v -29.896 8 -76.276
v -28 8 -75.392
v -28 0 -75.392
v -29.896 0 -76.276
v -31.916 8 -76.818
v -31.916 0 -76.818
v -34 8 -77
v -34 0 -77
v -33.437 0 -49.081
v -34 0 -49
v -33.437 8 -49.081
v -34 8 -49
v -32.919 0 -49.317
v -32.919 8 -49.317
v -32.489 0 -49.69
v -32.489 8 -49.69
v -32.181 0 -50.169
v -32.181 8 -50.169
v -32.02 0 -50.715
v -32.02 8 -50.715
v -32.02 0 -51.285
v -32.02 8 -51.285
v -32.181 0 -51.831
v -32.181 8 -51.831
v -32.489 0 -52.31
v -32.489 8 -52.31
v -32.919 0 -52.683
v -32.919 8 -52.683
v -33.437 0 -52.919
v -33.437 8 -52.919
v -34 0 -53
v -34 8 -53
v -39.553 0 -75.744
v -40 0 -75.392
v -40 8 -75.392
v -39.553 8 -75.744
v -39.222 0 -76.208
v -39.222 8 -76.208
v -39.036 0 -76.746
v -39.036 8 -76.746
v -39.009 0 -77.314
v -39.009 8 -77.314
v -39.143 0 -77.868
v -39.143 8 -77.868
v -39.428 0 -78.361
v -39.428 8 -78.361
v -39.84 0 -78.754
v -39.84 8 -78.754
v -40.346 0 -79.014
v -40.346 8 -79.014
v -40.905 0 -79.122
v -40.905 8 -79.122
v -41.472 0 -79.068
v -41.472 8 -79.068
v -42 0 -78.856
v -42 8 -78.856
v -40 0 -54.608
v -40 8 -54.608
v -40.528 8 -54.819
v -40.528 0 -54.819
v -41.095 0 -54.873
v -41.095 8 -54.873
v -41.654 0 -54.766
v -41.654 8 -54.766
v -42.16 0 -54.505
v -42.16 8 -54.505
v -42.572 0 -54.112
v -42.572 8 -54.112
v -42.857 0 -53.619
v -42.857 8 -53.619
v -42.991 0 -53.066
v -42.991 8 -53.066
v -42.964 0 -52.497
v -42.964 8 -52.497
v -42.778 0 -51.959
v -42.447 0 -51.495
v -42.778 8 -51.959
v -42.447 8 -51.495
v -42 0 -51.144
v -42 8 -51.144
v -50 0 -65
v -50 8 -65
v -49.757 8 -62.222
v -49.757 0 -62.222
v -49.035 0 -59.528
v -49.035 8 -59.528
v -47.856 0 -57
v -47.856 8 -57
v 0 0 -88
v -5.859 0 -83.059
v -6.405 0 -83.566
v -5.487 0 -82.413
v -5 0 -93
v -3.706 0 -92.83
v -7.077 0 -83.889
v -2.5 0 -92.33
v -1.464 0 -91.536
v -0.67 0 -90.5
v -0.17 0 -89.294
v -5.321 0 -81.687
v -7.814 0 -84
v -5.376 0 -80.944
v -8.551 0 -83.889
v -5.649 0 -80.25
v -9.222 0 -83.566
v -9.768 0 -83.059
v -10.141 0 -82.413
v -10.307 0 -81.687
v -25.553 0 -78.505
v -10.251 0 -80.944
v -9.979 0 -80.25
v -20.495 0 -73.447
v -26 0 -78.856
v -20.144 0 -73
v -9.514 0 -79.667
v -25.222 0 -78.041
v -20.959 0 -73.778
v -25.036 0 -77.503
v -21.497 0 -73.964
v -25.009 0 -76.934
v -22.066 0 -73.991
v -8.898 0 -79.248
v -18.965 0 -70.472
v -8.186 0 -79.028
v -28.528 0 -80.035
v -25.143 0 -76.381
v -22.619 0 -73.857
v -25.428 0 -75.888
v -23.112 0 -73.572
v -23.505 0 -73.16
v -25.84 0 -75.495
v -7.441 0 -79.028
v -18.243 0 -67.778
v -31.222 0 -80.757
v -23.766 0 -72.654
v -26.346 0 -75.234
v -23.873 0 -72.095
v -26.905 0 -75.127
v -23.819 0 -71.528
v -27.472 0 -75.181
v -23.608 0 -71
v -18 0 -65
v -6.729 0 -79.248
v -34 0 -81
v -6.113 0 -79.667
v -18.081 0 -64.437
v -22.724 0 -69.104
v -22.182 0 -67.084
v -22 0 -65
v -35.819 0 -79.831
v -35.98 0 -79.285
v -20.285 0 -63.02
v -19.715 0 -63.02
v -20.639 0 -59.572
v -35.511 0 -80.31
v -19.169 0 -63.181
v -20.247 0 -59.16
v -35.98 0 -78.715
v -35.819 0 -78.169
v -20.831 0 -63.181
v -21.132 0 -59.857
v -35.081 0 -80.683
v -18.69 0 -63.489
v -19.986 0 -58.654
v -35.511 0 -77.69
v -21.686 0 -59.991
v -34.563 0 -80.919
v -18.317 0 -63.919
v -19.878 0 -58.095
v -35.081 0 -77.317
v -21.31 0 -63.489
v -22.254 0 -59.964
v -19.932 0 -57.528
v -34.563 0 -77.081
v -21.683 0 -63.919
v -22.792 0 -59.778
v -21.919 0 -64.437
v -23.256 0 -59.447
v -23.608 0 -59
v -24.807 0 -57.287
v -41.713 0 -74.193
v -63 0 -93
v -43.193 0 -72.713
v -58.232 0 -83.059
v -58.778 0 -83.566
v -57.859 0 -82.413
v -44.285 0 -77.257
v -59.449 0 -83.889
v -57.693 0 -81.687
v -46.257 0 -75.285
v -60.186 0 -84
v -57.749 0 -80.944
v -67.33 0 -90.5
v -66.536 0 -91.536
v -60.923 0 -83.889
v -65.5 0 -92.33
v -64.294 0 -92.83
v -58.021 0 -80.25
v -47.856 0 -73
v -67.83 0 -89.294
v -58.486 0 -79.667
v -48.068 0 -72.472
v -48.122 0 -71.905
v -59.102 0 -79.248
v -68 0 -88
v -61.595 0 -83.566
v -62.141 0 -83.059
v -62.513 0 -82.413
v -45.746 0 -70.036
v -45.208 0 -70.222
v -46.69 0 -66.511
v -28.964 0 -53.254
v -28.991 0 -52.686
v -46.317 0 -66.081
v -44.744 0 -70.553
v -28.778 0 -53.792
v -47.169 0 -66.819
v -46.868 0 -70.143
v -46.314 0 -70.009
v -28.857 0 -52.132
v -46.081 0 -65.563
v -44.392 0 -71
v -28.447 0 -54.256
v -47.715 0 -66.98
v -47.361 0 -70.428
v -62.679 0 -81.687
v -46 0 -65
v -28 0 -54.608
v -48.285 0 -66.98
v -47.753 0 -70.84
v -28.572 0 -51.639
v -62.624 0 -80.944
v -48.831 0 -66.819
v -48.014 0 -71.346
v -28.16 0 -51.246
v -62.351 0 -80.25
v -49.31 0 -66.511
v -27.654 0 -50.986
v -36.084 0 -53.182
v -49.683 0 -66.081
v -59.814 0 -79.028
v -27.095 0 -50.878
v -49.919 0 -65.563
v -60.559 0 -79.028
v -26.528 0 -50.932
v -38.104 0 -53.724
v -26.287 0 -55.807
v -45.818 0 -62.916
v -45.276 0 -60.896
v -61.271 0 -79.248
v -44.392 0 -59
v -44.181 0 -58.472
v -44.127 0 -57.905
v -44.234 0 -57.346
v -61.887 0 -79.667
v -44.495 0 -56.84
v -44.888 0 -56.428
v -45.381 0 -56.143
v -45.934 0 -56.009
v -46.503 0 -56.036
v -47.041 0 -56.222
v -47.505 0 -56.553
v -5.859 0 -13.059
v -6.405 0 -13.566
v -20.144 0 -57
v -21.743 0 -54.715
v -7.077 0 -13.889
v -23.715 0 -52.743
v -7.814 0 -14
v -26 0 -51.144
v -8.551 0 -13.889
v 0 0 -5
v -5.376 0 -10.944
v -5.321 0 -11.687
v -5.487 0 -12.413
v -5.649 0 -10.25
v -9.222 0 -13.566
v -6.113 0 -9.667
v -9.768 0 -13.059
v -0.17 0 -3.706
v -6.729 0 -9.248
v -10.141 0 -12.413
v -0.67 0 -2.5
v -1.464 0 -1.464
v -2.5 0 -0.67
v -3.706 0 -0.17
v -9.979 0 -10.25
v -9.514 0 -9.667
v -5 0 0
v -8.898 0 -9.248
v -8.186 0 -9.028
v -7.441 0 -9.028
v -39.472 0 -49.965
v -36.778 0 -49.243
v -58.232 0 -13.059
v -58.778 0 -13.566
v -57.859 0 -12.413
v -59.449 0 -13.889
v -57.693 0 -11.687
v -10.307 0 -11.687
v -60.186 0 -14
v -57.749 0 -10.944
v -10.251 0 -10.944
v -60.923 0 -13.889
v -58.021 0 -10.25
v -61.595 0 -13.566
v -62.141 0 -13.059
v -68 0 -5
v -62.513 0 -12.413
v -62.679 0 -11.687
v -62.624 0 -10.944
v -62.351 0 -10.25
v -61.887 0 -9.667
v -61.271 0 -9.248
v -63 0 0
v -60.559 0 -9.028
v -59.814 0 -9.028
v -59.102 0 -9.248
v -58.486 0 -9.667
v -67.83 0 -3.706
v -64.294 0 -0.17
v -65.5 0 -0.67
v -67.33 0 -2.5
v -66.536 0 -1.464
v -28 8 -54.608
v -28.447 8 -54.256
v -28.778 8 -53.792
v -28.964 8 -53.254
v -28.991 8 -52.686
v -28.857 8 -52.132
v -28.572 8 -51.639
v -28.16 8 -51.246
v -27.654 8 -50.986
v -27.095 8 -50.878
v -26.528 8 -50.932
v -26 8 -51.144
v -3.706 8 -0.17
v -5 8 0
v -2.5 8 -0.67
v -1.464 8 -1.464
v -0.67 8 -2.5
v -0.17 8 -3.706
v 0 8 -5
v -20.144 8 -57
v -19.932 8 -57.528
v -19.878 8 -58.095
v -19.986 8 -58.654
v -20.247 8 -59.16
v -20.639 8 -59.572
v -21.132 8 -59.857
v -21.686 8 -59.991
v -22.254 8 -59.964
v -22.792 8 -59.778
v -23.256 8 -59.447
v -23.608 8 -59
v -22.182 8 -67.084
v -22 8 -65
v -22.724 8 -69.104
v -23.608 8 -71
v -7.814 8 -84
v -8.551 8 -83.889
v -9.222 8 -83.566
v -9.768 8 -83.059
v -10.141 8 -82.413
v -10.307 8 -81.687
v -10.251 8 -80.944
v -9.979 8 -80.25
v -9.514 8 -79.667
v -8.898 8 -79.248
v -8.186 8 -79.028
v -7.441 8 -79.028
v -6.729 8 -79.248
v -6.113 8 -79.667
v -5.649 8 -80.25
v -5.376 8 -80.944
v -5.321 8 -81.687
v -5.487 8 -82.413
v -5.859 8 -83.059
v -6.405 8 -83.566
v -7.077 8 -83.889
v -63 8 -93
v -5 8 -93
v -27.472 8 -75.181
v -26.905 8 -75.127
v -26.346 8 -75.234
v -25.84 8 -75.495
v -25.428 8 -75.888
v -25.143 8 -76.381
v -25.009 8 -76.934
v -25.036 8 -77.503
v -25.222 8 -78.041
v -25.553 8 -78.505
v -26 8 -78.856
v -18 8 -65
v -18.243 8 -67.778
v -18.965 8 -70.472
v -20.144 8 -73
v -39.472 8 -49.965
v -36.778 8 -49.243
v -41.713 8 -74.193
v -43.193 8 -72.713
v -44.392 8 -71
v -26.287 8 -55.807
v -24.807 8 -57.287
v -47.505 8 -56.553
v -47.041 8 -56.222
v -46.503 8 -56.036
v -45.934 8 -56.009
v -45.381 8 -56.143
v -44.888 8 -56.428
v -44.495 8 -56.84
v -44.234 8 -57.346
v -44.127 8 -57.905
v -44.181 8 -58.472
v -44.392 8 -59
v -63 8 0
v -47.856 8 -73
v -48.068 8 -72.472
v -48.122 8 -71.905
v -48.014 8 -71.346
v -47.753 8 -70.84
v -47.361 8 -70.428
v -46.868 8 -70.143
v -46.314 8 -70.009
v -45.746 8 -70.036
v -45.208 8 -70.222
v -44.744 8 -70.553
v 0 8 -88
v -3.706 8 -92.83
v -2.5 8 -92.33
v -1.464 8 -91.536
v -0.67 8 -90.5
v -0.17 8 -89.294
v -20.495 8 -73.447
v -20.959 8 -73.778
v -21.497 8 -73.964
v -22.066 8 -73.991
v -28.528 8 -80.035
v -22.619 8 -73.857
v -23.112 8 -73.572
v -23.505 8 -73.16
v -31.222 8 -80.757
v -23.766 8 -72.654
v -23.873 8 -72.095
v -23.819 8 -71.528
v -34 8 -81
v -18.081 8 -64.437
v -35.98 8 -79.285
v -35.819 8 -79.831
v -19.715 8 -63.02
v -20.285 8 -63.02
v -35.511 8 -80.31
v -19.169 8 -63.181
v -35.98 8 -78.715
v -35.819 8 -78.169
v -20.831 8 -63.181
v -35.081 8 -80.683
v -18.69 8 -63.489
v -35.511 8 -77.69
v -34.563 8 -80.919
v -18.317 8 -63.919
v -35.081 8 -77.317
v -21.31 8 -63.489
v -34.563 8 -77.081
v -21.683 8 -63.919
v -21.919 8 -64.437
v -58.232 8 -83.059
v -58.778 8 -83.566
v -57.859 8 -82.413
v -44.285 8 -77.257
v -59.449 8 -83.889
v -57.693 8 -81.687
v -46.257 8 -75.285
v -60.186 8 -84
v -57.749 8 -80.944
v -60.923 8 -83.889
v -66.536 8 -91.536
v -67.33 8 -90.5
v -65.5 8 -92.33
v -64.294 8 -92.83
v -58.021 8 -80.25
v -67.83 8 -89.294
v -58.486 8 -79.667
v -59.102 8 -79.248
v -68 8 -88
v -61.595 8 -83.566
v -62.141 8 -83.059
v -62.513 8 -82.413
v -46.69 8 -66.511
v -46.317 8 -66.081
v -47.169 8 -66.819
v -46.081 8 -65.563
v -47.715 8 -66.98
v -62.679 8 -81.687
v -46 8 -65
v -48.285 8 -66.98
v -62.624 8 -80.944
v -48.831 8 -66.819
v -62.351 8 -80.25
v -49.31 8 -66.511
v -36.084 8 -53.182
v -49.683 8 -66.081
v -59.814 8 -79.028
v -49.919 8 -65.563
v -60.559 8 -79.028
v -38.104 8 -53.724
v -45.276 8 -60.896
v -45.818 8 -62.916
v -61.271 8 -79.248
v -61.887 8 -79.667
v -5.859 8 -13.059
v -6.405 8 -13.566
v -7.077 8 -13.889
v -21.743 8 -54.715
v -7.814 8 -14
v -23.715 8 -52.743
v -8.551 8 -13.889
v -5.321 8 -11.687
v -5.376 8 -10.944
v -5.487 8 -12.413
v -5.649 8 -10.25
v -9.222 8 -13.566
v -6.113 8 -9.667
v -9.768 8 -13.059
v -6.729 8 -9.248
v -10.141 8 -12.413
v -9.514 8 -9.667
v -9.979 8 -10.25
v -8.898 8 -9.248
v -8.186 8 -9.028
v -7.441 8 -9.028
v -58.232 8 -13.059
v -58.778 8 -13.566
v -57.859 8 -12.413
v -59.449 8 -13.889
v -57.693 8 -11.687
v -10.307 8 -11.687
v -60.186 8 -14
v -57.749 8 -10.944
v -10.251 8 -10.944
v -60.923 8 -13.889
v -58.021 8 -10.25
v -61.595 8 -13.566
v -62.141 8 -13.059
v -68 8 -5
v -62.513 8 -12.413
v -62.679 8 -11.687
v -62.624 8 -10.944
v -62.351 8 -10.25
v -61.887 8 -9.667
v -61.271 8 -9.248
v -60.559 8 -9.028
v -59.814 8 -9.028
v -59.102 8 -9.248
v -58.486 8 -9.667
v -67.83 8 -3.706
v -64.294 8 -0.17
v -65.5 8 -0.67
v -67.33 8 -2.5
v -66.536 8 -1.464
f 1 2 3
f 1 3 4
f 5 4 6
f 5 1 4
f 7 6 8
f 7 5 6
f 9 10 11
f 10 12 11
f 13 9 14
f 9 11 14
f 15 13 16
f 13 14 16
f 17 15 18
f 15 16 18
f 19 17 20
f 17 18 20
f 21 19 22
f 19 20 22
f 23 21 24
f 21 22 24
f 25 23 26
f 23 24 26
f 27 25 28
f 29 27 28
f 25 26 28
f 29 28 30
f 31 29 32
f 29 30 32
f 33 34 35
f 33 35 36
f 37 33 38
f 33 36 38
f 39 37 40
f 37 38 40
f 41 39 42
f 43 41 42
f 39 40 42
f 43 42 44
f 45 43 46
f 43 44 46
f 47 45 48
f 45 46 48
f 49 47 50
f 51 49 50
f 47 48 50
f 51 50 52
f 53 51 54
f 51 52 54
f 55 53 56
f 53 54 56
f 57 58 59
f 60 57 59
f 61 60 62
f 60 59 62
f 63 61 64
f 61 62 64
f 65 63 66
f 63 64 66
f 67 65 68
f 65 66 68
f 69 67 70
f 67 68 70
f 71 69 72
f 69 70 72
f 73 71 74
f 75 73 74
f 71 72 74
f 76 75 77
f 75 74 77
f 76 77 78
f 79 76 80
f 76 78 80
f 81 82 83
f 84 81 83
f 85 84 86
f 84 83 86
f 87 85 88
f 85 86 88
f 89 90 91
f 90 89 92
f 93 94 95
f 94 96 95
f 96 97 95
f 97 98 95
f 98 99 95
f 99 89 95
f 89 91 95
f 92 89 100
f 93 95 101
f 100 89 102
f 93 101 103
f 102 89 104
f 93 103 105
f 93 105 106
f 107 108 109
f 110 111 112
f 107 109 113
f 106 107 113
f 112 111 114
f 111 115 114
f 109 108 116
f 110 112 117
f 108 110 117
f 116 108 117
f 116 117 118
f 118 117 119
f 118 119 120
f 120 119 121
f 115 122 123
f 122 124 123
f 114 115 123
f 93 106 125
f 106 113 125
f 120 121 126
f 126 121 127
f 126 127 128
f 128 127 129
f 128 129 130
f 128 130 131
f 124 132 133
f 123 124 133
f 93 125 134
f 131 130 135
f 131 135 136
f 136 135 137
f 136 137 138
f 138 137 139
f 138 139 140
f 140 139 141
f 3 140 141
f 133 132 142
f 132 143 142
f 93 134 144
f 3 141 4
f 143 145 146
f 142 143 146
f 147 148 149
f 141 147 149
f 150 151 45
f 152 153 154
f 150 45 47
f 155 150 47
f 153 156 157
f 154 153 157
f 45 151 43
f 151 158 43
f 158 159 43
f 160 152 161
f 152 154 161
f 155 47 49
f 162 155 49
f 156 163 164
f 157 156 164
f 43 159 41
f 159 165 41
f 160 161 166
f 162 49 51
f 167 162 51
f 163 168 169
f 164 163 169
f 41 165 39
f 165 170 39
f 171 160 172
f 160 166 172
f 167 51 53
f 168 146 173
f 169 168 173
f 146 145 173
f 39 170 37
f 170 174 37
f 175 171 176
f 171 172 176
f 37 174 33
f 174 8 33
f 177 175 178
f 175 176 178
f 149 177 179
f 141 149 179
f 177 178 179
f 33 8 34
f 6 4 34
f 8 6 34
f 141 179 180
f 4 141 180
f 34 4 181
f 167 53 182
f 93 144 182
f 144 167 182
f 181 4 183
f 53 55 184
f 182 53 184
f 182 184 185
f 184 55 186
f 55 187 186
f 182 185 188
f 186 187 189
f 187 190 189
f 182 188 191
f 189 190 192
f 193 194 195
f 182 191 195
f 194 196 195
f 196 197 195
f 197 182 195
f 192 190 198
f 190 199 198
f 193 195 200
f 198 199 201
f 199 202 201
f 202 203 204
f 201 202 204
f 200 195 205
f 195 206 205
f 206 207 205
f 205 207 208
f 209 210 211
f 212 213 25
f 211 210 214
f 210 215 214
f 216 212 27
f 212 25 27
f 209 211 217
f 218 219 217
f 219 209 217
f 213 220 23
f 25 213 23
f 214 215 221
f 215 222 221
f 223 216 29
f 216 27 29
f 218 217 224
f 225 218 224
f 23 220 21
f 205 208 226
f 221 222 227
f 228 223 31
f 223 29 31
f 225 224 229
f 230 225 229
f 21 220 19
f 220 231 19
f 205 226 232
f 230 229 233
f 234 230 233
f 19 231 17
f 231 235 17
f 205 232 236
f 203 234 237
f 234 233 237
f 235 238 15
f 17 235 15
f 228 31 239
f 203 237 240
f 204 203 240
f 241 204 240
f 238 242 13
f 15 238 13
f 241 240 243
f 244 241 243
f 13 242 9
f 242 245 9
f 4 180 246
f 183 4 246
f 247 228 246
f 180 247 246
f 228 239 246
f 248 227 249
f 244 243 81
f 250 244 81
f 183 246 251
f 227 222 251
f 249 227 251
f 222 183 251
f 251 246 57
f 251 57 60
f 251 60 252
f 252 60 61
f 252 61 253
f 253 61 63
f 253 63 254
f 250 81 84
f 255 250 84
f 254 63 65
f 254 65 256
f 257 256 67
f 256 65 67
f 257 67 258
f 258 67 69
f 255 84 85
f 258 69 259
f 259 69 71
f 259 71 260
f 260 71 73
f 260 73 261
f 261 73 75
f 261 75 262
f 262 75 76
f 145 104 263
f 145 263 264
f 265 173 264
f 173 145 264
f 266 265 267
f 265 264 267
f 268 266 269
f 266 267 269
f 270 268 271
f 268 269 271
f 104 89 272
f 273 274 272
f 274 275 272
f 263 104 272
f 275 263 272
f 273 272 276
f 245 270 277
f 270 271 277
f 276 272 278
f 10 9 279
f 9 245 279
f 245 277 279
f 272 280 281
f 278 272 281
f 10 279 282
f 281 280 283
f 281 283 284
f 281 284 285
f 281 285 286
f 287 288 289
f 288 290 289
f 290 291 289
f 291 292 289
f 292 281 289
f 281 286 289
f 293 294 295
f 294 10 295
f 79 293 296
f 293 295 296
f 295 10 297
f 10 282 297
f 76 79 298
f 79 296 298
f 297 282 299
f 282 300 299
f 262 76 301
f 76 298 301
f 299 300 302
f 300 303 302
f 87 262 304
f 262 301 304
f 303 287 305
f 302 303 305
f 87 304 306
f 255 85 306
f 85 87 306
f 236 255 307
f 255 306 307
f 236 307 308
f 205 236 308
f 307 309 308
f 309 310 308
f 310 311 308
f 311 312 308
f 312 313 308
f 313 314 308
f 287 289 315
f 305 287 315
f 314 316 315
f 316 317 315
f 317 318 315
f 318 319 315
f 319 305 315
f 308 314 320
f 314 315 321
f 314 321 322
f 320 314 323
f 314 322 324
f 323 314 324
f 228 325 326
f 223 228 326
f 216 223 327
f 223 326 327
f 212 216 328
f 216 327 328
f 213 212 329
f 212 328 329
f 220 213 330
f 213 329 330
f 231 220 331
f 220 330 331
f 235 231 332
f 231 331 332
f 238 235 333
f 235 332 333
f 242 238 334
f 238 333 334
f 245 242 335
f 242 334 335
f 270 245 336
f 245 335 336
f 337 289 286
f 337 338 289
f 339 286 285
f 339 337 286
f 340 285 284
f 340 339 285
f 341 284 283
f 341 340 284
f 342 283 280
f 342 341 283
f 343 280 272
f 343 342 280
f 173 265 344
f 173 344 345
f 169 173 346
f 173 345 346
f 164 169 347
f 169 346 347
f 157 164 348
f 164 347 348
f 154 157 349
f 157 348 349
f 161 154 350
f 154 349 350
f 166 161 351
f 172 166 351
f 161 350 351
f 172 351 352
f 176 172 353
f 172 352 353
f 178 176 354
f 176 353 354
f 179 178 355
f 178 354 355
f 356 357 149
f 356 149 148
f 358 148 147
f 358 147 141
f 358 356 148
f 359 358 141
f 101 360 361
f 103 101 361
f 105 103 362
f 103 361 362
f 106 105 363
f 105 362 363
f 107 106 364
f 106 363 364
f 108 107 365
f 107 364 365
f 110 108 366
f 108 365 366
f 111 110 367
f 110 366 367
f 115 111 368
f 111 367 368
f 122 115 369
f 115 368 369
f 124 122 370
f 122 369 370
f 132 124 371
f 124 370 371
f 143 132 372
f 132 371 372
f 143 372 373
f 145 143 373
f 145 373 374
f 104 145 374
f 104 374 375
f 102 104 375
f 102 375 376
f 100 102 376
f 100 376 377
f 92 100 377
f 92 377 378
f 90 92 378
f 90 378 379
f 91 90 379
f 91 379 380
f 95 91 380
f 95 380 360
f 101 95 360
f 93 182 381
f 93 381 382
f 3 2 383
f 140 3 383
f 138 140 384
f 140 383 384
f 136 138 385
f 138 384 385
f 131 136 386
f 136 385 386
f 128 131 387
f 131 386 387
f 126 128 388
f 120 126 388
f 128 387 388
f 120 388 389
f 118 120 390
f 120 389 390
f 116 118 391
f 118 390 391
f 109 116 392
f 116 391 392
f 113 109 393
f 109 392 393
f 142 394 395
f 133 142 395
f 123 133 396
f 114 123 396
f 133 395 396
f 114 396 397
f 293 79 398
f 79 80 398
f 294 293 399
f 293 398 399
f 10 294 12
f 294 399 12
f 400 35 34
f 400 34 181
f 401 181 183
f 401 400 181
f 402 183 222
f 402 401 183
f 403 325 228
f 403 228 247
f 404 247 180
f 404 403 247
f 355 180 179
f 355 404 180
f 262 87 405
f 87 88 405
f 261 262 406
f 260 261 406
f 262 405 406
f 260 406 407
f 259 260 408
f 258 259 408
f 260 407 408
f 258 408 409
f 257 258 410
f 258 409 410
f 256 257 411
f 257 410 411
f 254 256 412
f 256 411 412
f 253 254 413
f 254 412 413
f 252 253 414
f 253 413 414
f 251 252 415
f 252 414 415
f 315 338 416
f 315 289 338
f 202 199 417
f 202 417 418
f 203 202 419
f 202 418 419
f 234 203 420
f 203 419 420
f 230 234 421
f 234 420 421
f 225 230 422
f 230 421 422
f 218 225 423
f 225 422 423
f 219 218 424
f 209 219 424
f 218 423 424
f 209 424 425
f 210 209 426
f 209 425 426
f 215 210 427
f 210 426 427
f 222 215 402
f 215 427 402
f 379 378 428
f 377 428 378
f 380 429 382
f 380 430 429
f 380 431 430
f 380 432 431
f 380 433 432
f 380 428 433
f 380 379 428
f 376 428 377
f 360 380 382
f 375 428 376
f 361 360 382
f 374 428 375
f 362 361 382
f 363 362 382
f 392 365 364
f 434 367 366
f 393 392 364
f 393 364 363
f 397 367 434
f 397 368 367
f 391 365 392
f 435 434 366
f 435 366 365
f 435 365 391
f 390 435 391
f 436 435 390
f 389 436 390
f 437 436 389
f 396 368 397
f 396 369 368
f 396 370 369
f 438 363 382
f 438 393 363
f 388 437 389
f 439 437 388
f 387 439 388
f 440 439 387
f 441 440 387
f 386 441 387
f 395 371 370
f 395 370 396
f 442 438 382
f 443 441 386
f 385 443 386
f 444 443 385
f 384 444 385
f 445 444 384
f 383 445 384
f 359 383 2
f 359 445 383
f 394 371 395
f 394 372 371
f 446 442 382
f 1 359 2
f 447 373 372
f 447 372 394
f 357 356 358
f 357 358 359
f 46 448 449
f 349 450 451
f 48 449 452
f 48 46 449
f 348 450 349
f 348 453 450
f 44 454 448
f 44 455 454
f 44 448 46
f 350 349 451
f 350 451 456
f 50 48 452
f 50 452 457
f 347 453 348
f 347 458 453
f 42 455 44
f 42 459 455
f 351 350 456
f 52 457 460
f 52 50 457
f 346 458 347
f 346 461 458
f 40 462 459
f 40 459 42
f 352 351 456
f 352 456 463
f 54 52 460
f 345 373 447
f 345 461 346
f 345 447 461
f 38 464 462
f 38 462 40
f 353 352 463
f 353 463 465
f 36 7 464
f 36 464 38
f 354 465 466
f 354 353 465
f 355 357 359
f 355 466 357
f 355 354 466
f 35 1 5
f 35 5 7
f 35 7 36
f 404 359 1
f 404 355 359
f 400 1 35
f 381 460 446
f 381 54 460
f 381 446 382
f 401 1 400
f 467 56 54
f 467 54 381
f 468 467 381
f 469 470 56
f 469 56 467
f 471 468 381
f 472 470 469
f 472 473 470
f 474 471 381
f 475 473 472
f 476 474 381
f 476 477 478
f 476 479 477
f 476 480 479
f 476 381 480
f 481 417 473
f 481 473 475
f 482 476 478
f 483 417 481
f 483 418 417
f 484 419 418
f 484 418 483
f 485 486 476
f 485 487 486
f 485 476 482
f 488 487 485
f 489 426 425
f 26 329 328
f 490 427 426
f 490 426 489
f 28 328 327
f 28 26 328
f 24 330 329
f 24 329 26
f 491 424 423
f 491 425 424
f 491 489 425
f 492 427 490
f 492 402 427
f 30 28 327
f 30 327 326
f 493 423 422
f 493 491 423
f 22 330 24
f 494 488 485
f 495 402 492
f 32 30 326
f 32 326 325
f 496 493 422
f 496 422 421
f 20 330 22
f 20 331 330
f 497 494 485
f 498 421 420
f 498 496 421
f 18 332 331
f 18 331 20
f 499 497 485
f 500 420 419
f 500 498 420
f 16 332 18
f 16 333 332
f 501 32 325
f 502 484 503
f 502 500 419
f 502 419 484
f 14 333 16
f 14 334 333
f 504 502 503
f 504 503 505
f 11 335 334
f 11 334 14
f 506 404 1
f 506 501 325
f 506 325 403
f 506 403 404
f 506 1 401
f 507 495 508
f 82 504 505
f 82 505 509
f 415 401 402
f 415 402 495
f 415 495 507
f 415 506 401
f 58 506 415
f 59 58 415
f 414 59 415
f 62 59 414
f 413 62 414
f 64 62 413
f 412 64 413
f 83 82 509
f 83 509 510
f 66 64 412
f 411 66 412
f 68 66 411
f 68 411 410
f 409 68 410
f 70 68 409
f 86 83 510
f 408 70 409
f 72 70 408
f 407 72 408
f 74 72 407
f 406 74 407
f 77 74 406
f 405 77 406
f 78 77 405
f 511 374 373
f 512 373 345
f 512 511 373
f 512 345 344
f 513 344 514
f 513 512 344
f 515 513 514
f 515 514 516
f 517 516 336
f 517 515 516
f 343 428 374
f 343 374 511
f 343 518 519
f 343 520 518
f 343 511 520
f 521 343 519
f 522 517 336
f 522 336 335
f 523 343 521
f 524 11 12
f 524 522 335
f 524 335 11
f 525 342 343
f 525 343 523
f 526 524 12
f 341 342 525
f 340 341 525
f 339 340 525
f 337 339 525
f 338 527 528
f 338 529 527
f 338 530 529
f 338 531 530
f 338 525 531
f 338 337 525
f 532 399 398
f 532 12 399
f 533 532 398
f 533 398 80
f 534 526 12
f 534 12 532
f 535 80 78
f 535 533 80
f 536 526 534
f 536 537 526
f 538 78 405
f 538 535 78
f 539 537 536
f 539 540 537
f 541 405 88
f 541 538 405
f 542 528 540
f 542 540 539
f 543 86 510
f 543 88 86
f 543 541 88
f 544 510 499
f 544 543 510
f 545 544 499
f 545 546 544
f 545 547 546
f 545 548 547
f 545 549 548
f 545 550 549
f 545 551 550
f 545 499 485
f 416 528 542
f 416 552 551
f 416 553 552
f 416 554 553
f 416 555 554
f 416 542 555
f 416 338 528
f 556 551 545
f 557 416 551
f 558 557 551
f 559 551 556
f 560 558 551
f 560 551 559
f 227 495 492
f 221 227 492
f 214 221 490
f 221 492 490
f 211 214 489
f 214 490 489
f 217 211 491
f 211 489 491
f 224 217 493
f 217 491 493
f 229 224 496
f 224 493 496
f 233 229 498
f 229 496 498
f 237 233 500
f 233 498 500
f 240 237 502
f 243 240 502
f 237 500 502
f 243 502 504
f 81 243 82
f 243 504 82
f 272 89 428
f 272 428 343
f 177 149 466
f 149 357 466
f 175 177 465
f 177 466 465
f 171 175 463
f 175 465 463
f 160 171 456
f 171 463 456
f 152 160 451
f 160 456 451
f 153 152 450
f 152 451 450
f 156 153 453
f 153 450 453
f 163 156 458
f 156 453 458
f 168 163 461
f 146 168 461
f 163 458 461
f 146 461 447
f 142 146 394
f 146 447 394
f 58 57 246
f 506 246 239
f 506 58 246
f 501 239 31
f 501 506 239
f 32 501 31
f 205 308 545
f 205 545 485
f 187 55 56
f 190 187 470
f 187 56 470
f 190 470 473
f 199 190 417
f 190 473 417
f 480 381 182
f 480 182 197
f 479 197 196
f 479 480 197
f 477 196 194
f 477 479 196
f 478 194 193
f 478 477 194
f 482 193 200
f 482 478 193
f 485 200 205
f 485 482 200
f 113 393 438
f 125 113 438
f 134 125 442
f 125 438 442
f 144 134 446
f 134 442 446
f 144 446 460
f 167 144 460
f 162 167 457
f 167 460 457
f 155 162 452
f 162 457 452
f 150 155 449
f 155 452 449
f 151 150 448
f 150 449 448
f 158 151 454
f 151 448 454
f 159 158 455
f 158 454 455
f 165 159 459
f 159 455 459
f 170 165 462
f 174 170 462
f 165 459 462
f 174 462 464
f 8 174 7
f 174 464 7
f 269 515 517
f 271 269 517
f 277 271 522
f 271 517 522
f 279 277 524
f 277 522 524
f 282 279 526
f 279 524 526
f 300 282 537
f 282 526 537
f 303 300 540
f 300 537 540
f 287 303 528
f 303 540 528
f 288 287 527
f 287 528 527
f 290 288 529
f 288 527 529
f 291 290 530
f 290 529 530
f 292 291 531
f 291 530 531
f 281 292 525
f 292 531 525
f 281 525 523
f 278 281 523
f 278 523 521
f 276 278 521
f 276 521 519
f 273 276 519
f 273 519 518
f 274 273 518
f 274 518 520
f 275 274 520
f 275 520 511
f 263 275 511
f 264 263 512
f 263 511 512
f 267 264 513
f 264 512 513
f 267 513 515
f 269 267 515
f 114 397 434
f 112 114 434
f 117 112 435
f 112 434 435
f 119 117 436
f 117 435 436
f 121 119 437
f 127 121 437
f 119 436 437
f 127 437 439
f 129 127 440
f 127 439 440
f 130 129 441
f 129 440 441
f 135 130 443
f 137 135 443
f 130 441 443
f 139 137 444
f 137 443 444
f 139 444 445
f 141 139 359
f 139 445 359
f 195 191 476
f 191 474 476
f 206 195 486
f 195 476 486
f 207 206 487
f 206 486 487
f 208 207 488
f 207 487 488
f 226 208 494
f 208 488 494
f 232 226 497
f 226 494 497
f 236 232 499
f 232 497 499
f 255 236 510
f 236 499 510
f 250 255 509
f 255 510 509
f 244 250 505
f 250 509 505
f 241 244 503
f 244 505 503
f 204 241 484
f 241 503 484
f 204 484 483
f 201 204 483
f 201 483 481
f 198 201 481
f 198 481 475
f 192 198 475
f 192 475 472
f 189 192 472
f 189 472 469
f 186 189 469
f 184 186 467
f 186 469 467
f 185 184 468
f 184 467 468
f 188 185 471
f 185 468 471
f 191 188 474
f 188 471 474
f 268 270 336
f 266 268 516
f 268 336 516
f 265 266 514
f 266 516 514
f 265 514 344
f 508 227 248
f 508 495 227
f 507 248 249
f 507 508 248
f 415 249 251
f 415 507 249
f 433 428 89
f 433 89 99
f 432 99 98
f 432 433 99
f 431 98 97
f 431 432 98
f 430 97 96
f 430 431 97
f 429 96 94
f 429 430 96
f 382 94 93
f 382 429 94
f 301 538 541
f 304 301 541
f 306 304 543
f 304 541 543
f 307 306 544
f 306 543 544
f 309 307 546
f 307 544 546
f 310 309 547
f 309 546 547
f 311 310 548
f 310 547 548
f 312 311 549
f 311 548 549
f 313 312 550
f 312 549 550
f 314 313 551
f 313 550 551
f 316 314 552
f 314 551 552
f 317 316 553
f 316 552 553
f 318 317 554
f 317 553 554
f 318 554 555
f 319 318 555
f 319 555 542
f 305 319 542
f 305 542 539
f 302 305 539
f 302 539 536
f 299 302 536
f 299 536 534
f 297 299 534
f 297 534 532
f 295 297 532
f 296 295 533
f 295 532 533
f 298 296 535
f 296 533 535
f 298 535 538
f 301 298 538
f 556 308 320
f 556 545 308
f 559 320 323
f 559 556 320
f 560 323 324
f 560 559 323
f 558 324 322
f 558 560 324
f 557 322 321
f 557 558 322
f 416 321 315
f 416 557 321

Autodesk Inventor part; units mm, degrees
ref_plane "YZ Plane" through (0, 0, 0) normal (1, 0, 0) x (0, 1, 0)
ref_plane "XZ Plane" through (0, 0, 0) normal (0, 1, 0) x (-1, 0, 0)
ref_plane "XY Plane" through (0, 0, 0) normal (0, 0, 1) x (1, 0, 0)
sketch "Sketch1" plane through (0, 0, 0) normal (0, 1, 0) x (-1, 0, 0)
  line L0 (0, 0) -> (68, 0)
  line L1 (68, 0) -> (68, -93)
  line L2 (68, -93) -> (0, -93)
  line L3 (0, -93) -> (0, 0)
  dimension "d0" = 93
  dimension "d1" = 68
extrude "Extrusion1" add sketch "Sketch1" along normal blind 8
fillet "Fillet1" radius 5 2 edges at (0, 4, -93) (-68, 4, -93)
fillet "Fillet2" radius 5 2 edges at (-68, 4, 0) (0, 4, 0)
sketch "Sketch2" plane through (0, 0, 0) normal (0, -1, 0) x (1, 0, 0)
  circle A0 centre (-7.8137, -81.5) radius 4
  circle A1 centre (-60.1863, -81.5) radius 4
  circle A2 centre (-60.1863, -11.5) radius 4
  circle A3 centre (-7.8137, -11.5) radius 4
  circle A4 centre (-34, -36) radius 4
  point P0 (0, 0)
  dimension "d27" = 70
  dimension "d28" = 52.3726
  dimension "d29" = 8
  dimension "d30" = 24.5
  dimension "d31" = 26.1863
  dimension "d32" = 11.5
  dimension "d33" = 7.8137
hole "Hole1" at (-7.8137, 0, -81.5) at (-60.1863, 0, -81.5) at (-60.1863, 0, -11.5) at (-7.8137, 0, -11.5) direction (0, 1, 0) diameter 5 end through all
sketch "Sketch3" plane through (0, 8, 0) normal (0, 1, 0) x (1, 0, 0)
  circle A0 centre (-34, 65) radius 11.8188 construction
  line L0 (-63, 0) -> (-5, 0) projected
  line L1 (0, 5) -> (0, 88) projected
  arc A1 (-27, 77.1244) -> (-34, 79) centre (-34, 65) ccw construction
  arc A2 (-26, 78.8564) -> (-34, 81) centre (-34, 65) ccw
  arc A3 (-28, 75.3923) -> (-34, 77) centre (-34, 65) ccw
  arc A4 (-28, 75.3923) -> (-26, 78.8564) centre (-27, 77.1244) ccw
  arc A5 (-34, 81) -> (-34, 77) centre (-34, 79) ccw
  line L2 (-27, 77.1244) -> (-34, 65) construction
  line L3 (-34, 65) -> (-34, 79) construction
  arc A6 (-41, 77.1244) -> (-46.1244, 72) centre (-34, 65) ccw construction
  arc A7 (-42, 78.8564) -> (-47.8564, 73) centre (-34, 65) ccw
  arc A8 (-40, 75.3923) -> (-44.3923, 71) centre (-34, 65) ccw
  arc A9 (-40, 75.3923) -> (-42, 78.8564) centre (-41, 77.1244) ccw
  arc A10 (-47.8564, 73) -> (-44.3923, 71) centre (-46.1244, 72) ccw
  arc A11 (-48, 65) -> (-46.1244, 58) centre (-34, 65) ccw construction
  arc A12 (-50, 65) -> (-47.8564, 57) centre (-34, 65) ccw
  arc A13 (-46, 65) -> (-44.3923, 59) centre (-34, 65) ccw
  arc A14 (-46, 65) -> (-50, 65) centre (-48, 65) ccw
  arc A15 (-47.8564, 57) -> (-44.3923, 59) centre (-46.1244, 58) ccw
  arc A16 (-41, 52.8756) -> (-34, 51) centre (-34, 65) ccw construction
  arc A17 (-42, 51.1436) -> (-34, 49) centre (-34, 65) ccw
  arc A18 (-40, 54.6077) -> (-34, 53) centre (-34, 65) ccw
  arc A19 (-40, 54.6077) -> (-42, 51.1436) centre (-41, 52.8756) ccw
  arc A20 (-34, 49) -> (-34, 53) centre (-34, 51) ccw
  line L4 (-5, 93) -> (-63, 93) projected
  arc A21 (-27, 52.8756) -> (-21.8756, 58) centre (-34, 65) ccw construction
  arc A22 (-26, 51.1436) -> (-20.1436, 57) centre (-34, 65) ccw
  arc A23 (-28, 54.6077) -> (-23.6077, 59) centre (-34, 65) ccw
  arc A24 (-28, 54.6077) -> (-26, 51.1436) centre (-27, 52.8756) ccw
  arc A25 (-20.1436, 57) -> (-23.6077, 59) centre (-21.8756, 58) ccw
  arc A26 (-20, 65) -> (-21.8756, 72) centre (-34, 65) ccw construction
  arc A27 (-18, 65) -> (-20.1436, 73) centre (-34, 65) ccw
  arc A28 (-22, 65) -> (-23.6077, 71) centre (-34, 65) ccw
  arc A29 (-22, 65) -> (-18, 65) centre (-20, 65) ccw
  arc A30 (-20.1436, 73) -> (-23.6077, 71) centre (-21.8756, 72) ccw
  point P0 (0, 0)
  dimension "d15" = 4
  dimension "d16" = 30
  dimension "d18" = 14
  dimension "d19" = 34
  dimension "d22" = 360
  dimension "d26" = 28
extrude "Extrusion2" cut sketch "Sketch3" against normal through all
properties part number "Z_platte_oben_new" material "PET Plastic"
